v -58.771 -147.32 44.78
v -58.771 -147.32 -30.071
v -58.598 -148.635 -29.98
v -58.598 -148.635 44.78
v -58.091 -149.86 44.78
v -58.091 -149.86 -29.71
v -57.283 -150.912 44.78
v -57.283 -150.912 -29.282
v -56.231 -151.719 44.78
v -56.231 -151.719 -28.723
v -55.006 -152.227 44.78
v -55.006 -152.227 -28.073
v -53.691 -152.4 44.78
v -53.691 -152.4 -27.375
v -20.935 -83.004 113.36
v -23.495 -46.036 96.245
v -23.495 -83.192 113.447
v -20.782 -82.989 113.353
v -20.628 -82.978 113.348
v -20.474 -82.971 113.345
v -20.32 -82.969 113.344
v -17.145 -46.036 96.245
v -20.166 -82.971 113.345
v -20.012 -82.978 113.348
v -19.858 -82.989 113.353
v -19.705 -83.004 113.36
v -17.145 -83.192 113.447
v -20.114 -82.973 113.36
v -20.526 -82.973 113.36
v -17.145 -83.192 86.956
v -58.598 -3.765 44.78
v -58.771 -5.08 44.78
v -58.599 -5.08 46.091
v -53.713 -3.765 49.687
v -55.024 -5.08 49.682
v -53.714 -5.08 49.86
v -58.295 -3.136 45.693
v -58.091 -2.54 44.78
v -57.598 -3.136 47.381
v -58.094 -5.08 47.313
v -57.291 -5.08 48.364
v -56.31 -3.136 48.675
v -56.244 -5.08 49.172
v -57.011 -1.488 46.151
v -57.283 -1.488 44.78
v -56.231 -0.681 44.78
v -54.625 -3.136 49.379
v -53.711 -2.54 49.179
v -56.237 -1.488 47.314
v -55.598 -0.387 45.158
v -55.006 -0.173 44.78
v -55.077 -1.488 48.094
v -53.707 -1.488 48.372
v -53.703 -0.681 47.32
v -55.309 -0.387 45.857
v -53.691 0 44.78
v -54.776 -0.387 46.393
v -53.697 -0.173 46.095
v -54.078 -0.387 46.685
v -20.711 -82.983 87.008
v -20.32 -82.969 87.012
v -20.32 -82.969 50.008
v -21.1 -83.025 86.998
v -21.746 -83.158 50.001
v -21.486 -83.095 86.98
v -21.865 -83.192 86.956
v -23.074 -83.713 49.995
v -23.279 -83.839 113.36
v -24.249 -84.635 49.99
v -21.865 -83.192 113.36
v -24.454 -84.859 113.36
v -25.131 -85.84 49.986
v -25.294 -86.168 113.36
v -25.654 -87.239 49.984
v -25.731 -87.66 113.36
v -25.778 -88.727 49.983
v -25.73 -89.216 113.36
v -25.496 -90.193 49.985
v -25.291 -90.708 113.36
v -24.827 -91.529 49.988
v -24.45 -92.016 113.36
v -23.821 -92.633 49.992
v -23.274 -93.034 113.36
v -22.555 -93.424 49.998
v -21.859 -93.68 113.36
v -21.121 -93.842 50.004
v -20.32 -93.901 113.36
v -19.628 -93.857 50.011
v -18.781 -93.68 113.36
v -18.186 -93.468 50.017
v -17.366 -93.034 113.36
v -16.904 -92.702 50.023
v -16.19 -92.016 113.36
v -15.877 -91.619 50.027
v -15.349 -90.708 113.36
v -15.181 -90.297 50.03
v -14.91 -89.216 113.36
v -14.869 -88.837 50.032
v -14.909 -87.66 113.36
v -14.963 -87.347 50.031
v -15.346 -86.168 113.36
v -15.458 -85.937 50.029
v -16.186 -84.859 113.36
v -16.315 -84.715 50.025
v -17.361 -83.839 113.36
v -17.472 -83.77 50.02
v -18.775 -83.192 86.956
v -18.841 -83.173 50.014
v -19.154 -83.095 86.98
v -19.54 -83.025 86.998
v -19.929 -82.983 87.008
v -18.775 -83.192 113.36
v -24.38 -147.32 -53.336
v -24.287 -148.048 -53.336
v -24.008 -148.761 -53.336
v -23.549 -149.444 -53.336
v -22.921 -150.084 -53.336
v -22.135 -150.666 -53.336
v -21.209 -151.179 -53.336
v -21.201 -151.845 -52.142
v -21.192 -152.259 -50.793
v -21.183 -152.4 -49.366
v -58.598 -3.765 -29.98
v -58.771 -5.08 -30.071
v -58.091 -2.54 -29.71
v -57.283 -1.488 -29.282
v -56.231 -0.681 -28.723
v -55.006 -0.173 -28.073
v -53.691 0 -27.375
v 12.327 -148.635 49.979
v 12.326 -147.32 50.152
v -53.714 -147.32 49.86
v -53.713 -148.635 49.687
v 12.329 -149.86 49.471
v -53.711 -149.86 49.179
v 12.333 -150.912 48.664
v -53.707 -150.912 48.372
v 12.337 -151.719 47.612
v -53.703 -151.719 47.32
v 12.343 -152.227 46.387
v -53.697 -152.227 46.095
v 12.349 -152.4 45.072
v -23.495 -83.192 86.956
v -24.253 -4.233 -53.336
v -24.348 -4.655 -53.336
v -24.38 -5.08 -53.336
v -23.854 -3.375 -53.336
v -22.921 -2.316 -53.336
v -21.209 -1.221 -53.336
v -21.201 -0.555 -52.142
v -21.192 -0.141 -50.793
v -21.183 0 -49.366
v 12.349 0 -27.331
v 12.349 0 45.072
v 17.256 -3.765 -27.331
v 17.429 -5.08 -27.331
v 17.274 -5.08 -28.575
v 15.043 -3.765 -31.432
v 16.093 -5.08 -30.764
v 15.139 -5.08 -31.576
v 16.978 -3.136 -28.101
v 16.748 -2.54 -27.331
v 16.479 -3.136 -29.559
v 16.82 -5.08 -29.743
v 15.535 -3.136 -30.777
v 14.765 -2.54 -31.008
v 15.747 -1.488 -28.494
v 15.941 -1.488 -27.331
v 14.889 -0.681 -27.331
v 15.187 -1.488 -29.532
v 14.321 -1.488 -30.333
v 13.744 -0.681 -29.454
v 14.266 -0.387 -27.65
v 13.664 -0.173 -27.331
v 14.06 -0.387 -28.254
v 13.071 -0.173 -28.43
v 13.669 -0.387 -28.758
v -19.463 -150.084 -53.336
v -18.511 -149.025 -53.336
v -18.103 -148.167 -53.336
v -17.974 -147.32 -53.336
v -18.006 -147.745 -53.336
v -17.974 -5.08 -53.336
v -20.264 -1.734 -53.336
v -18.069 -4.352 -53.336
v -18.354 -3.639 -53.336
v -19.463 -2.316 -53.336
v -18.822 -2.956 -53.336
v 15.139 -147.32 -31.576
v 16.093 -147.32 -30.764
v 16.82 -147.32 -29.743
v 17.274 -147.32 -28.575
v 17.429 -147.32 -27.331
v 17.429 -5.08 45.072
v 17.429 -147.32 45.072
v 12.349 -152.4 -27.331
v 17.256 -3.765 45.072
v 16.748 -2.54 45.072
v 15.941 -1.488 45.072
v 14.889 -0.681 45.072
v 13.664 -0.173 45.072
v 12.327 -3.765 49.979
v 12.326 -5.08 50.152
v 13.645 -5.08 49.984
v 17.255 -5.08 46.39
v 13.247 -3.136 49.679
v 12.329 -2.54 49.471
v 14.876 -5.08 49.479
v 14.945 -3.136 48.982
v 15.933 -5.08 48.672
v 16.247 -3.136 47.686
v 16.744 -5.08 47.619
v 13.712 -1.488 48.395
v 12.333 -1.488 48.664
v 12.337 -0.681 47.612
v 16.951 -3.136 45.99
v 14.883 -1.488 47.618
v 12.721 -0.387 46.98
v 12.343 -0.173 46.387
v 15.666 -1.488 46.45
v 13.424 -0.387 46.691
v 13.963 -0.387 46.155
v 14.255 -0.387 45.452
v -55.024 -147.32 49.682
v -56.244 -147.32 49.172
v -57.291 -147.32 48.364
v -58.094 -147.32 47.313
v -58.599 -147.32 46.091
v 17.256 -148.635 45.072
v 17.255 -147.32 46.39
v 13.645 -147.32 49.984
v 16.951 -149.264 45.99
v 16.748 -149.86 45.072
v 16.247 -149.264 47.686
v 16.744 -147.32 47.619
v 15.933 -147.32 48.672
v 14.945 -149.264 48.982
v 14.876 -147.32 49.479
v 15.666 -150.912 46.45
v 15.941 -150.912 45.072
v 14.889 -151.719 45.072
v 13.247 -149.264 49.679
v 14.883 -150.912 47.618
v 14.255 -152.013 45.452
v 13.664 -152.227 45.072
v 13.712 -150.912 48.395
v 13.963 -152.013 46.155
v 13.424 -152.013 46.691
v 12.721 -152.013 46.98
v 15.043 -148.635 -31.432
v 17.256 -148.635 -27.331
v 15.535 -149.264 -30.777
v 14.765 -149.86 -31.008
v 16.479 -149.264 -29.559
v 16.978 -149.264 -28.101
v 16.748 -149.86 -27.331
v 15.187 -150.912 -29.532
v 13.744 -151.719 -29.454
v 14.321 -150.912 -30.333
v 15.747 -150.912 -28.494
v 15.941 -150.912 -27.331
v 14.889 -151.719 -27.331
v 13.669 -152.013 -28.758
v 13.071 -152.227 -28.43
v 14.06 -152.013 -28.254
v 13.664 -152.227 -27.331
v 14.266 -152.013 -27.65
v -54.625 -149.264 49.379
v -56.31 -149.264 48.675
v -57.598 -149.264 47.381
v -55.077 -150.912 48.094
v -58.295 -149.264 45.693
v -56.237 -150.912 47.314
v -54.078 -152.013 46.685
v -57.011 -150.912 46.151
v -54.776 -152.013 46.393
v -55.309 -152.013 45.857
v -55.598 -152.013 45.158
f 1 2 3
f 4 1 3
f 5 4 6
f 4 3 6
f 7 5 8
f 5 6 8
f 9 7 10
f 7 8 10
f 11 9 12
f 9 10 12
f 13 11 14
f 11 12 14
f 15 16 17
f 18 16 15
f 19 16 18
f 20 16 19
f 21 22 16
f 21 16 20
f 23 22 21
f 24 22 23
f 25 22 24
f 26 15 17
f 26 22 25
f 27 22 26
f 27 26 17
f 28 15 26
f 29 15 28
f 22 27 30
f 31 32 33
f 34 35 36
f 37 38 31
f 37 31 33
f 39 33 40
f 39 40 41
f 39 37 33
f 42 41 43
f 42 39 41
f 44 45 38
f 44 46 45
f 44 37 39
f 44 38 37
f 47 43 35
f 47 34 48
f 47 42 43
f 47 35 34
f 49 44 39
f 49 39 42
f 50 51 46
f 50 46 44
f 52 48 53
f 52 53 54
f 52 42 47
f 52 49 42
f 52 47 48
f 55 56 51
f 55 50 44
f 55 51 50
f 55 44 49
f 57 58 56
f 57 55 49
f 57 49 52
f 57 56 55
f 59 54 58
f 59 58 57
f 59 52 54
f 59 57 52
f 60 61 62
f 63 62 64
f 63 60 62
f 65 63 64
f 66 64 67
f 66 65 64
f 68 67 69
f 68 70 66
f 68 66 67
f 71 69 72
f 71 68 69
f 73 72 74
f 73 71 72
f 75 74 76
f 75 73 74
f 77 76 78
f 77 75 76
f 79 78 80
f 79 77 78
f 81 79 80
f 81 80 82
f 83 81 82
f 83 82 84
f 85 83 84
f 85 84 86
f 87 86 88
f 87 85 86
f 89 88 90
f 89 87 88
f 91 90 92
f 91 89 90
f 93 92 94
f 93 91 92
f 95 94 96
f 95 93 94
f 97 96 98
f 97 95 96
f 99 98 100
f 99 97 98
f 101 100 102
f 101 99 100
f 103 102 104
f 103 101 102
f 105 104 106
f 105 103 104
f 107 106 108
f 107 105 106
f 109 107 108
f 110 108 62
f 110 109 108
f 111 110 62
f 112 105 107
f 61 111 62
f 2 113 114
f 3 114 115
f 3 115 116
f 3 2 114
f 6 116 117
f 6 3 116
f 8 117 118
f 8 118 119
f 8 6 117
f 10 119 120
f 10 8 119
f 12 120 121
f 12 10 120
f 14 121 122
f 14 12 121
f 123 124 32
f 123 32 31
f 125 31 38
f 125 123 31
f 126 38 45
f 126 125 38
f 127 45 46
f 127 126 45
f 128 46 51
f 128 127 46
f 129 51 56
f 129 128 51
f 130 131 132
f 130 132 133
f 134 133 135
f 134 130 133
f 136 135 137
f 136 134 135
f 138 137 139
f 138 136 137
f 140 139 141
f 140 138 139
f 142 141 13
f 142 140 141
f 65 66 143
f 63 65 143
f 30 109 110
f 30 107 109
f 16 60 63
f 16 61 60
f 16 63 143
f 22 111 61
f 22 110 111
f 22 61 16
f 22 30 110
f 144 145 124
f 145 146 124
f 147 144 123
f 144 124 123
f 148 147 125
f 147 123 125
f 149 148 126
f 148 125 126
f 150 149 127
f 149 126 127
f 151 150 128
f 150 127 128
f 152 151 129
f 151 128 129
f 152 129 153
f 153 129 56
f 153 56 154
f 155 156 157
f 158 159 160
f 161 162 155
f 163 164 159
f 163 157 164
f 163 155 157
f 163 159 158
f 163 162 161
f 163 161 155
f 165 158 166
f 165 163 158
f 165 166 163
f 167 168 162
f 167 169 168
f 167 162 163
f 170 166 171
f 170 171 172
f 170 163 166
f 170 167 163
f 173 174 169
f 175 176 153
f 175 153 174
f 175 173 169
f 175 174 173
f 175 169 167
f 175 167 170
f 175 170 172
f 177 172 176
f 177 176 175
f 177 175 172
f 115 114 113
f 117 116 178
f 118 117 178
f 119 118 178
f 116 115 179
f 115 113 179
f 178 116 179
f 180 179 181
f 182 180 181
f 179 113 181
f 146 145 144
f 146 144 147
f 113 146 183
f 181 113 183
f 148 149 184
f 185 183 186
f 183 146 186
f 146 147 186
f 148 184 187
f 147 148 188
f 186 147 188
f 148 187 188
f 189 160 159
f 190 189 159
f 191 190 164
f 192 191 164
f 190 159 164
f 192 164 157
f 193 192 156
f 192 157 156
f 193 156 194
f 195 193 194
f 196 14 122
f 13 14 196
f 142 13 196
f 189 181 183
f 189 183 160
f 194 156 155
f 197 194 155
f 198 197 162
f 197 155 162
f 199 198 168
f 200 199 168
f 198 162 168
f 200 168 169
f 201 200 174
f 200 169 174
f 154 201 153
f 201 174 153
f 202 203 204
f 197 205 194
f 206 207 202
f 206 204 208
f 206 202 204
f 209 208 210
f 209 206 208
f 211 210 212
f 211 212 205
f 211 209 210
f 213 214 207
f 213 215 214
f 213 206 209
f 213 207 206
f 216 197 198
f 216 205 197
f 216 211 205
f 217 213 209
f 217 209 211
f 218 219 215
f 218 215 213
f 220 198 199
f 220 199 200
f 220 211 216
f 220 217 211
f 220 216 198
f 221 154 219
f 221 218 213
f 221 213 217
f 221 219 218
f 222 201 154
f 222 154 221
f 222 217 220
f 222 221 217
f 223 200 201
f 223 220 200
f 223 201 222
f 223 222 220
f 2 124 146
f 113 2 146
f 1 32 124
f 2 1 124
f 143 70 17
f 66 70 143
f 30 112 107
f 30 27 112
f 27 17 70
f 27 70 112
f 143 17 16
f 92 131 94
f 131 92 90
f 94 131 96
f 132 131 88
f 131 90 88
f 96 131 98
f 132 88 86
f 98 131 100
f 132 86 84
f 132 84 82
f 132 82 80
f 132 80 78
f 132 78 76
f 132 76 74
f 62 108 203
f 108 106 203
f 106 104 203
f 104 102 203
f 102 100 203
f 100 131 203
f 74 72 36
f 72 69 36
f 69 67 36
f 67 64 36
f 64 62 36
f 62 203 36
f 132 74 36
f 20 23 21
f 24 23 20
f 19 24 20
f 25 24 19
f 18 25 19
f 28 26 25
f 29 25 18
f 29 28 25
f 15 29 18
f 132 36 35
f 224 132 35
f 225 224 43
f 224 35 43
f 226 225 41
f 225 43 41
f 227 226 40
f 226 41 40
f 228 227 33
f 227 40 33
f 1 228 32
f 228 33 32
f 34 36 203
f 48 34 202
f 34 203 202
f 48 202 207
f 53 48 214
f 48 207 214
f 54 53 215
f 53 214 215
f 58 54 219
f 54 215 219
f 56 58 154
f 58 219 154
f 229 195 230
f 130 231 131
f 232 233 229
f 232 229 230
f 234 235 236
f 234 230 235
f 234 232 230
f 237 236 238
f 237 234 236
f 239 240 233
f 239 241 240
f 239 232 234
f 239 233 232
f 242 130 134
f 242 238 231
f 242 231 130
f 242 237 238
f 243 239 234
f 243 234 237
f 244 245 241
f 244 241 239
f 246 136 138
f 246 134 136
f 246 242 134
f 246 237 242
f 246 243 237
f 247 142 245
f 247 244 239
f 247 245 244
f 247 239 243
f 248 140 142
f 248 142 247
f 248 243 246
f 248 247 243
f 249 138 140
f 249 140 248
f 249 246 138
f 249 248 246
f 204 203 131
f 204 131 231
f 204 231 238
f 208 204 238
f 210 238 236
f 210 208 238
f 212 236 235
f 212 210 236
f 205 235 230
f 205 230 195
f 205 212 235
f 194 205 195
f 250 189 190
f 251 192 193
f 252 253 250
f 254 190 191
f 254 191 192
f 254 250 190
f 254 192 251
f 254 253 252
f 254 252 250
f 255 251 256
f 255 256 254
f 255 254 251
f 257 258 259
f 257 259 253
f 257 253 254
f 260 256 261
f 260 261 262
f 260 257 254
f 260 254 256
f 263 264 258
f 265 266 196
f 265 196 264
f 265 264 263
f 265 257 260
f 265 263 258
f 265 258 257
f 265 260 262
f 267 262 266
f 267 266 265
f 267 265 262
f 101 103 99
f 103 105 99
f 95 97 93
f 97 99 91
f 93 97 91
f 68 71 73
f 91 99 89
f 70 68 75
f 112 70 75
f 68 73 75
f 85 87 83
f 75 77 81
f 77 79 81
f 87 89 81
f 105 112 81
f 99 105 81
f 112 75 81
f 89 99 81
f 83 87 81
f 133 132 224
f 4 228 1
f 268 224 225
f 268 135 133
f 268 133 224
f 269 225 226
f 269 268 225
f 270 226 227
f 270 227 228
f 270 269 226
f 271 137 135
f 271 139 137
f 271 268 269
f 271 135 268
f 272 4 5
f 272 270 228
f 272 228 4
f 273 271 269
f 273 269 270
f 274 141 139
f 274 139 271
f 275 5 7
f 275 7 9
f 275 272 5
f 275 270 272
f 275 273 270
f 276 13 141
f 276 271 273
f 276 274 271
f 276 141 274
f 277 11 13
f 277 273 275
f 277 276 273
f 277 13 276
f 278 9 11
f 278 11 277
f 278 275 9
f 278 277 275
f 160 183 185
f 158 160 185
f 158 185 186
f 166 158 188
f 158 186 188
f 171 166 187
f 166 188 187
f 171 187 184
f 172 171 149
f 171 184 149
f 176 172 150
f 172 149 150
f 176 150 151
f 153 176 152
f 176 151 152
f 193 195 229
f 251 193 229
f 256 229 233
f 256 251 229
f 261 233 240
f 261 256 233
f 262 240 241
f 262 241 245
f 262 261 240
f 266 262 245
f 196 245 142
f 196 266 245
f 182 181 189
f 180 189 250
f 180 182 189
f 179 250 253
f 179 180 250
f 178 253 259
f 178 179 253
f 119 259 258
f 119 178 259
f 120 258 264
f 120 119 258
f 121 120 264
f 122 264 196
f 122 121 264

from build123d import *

# Parameters (mm, degrees)
F1_DEPTH     = 152.4
F2_T1_DEPTH  = 159.9639298233
F2_T3_DEPTH  = 87.5512753886
F2_T5_DEPTH  = 105.6460143168
F2_T7_DEPTH  = 83.8431740092
F2_T9_DEPTH  = 66.9209927252
F2_T11_DEPTH = 67.7625979145
F2_T16_DEPTH = 5.08
F4_W         = 5.4661177176
F4_H         = 63.5
F7_DEPTH     = 3.175
F8_T1_DEPTH  = 142.24
F8_T3_DEPTH  = 87.5512753886
F8_T5_DEPTH  = 66.9209927252
F8_T7_DEPTH  = 52.3221869503
F8_T9_DEPTH  = 72.4030758235
F8_T11_DEPTH = 66.0406464801
F8_T16_DEPTH = 5.08
F8_T22_DEPTH = 5.08
F8_T28_DEPTH = 5.08
F8_T34_DEPTH = 5.08
F8_T38_ANGLE = 89.746481368


# Not quite as in the source:
# - a fillet or chamfer that OpenCascade refuses, or shapes differently, is made with other operations: its cross-section is extruded or revolved along the edge and cut away or added


with BuildPart() as f1:
    # F0 (on Front) → F1 (new body)
    with BuildSketch(Plane.XZ):
        Polygon((17.4287217617, 50.174562376), (-58.7712782383, 49.8373953771), (-58.7712782383, -30.0714519408), (-24.3801281386, -53.3360523395), (-17.9739344996, -53.3360523395), (17.4287217617, -30.0714519408), align=None)
    extrude(amount=F1_DEPTH)

    # F2: fillet of radius 5.08 on 6 edges, made by hand

    # F2_s2 → F2_t1 (cut)
    with BuildSketch(Plane.XZ.offset(-12.6439298233)):
        with BuildLine():
            ThreePointArc((-53.7137558182, 49.859773719), (-57.2913189399, 48.3639700613), (-58.7712782383, 44.7798234478))
            Line((-58.7712782383, 44.7798234478), (-58.7712782383, 49.8373953771))
            Line((-58.7712782383, 49.8373953771), (-53.7137558182, 49.859773719))
        make_face()
    extrude(amount=F2_T1_DEPTH, mode=Mode.SUBTRACT)

    # F2_s4 → F2_t3 (cut)
    with BuildSketch(Plane.XY.offset(-42.7714519408)):
        with BuildLine():
            ThreePointArc((-58.7712782383, -147.32), (-57.2833806867, -150.9121024484), (-53.6912782383, -152.4))
            Line((-53.6912782383, -152.4), (-58.7712782383, -152.4))
            Line((-58.7712782383, -152.4), (-58.7712782383, -147.32))
        make_face()
    extrude(amount=F2_T3_DEPTH, mode=Mode.SUBTRACT)

    # F2_s6 → F2_t5 (cut)
    with BuildSketch(Plane.XY.offset(-42.7714519408)):
        with BuildLine():
            ThreePointArc((17.4287217617, -147.32), (15.9408242101, -150.9121024484), (12.3487217617, -152.4))
            Line((12.3487217617, -152.4), (17.4287217617, -152.4))
            Line((17.4287217617, -152.4), (17.4287217617, -147.32))
        make_face()
    extrude(amount=F2_T5_DEPTH, mode=Mode.SUBTRACT)

    # F2_s8 → F2_t7 (cut)
    with BuildSketch(Plane(origin=(30.3502624567, 0, 0.1342927416), x_dir=(0, 1, 0), z_dir=(-0.9999902109, 0, -0.0044247205))):
        with BuildLine():
            ThreePointArc((-147.32, -50.0969539894), (-150.9121024484, -48.6090564378), (-152.4, -45.0169539894))
            Line((-152.4, -45.0169539894), (-152.4, -50.0969539894))
            Line((-152.4, -50.0969539894), (-147.32, -50.0969539894))
        make_face()
    extrude(amount=F2_T7_DEPTH, mode=Mode.SUBTRACT)

    # F2_s10 → F2_t9 (cut)
    with BuildSketch(Plane(origin=(-36.8834278428, 0, 24.9505529071), x_dir=(0, 1, 0), z_dir=(0.8282834259, 0, -0.5603093489))):
        with BuildLine():
            ThreePointArc((-147.32, -57.8377818767), (-150.9121024484, -56.3498843251), (-152.4, -52.7577818767))
            Line((-152.4, -52.7577818767), (-152.4, -57.8377818767))
            Line((-152.4, -57.8377818767), (-147.32, -57.8377818767))
        make_face()
    extrude(amount=F2_T9_DEPTH, mode=Mode.SUBTRACT)

    # F2_s12 → F2_t11 (cut)
    with BuildSketch(Plane(origin=(-47.6451540495, 0, -31.3096695828), x_dir=(0, 1, 0), z_dir=(0.8357055045, 0, 0.549177849))):
        with BuildLine():
            ThreePointArc((-147.32, -34.7023458418), (-150.9121024484, -33.2144482902), (-152.4, -29.6223458418))
            Line((-152.4, -29.6223458418), (-152.4, -34.7023458418))
            Line((-152.4, -34.7023458418), (-147.32, -34.7023458418))
        make_face()
    extrude(amount=F2_T11_DEPTH, mode=Mode.SUBTRACT)


with BuildPart() as f2_tool14:
    # F2_s15 → F2_t16 (new body)
    with BuildSketch(Plane.XZ.offset(147.32)):
        Polygon((-53.6912782383, 44.7798234478), (-53.7137558182, 49.859773719), (-58.7712782383, 49.8373953771), (-58.7712782383, 44.7798234478), align=None)
    extrude(amount=F2_T16_DEPTH)

    # F2_s17 → F2_t18 (revolve, cut)
    with BuildSketch(Plane(origin=(-53.6912782383, -147.32, 44.7798234478), x_dir=(0.7086694294, 0, -0.7055406719), z_dir=(-0.7055406719, 0, -0.7086694294))):
        with BuildLine():
            ThreePointArc((0, -5.08), (5.08, 0), (0, 5.08))
            Line((0, 5.08), (0, -5.08))
        make_face()
    revolve(axis=Axis((-53.6912782383, -147.32, 44.7798234478), (0, -1, 0)), mode=Mode.SUBTRACT)


with BuildPart() as f1_1:
    add(f1.part)

    # F2_t13: cut F2_tool14
    add(f2_tool14.part, mode=Mode.SUBTRACT)

    # F4 (on offset) → F5 (revolve)
    with BuildSketch(Plane.YZ.offset(-20.32)):
        with Locations((-85.7021328023, 81.609773719)):
            Rectangle(F4_W, F4_H)
    revolve(axis=Axis((-20.32, -88.4351916611, 88.4142501174), (0, 0, 1)))

    # F6 (on offset) → F7 (join, symmetric)
    with BuildSketch(Plane.YZ.offset(-20.32)):
        Polygon((-46.0359752178, 96.2450280786), (-83.1919163465, 113.4468540549), (-83.1919163465, 86.9560390711), align=None)
    extrude(amount=F7_DEPTH, both=True)

    # F8: fillet of radius 5.08 on 8 edges, made by hand

    # F8_s2 → F8_t1 (cut)
    with BuildSketch(Plane.XZ.offset(5.08)):
        with BuildLine():
            ThreePointArc((12.3262441818, 50.1519851181), (15.9328683752, 48.6720755484), (17.4287217617, 45.0720348468))
            Line((17.4287217617, 45.0720348468), (17.4287217617, 50.174562376))
            Line((17.4287217617, 50.174562376), (12.3262441818, 50.1519851181))
        make_face()
        with BuildLine():
            ThreePointArc((15.1385452344, -31.5764249394), (16.8196670332, -29.7428967724), (17.4287217617, -27.3310409766))
            Line((17.4287217617, -27.3310409766), (17.4287217617, -30.0714519408))
            Line((17.4287217617, -30.0714519408), (15.1385452344, -31.5764249394))
        make_face()
    extrude(amount=F8_T1_DEPTH, mode=Mode.SUBTRACT)

    # F8_s4 → F8_t3 (cut)
    with BuildSketch(Plane.XY.offset(-42.7714519408)):
        with BuildLine():
            ThreePointArc((-58.7712782383, -5.08), (-57.2833806867, -1.4878975516), (-53.6912782383, 0))
            Line((-53.6912782383, 0), (-58.7712782383, 0))
            Line((-58.7712782383, 0), (-58.7712782383, -5.08))
        make_face()
    extrude(amount=F8_T3_DEPTH, mode=Mode.SUBTRACT)

    # F8_s6 → F8_t5 (cut)
    with BuildSketch(Plane(origin=(-36.8834278428, 0, 24.9505529071), x_dir=(0, 1, 0), z_dir=(0.8282834259, 0, -0.5603093489))):
        with BuildLine():
            ThreePointArc((-5.08, -57.8377818767), (-1.4878975516, -56.3498843251), (0, -52.7577818767))
            Line((0, -52.7577818767), (0, -57.8377818767))
            Line((0, -57.8377818767), (-5.08, -57.8377818767))
        make_face()
    extrude(amount=F8_T5_DEPTH, mode=Mode.SUBTRACT)

    # F8_s8 → F8_t7 (cut)
    with BuildSketch(Plane(origin=(-47.6451540495, 0, -31.3096695828), x_dir=(0, 1, 0), z_dir=(0.8357055045, 0, 0.549177849))):
        with BuildLine():
            ThreePointArc((-5.08, -34.7023458418), (-1.4878975516, -33.2144482902), (0, -29.6223458418))
            Line((0, -29.6223458418), (0, -34.7023458418))
            Line((0, -34.7023458418), (-5.08, -34.7023458418))
        make_face()
    extrude(amount=F8_T7_DEPTH, mode=Mode.SUBTRACT)

    # F8_s10 → F8_t9 (cut)
    with BuildSketch(Plane.XY.offset(-27.3310409766)):
        with BuildLine():
            ThreePointArc((17.4287217617, -5.08), (15.9408242101, -1.4878975516), (12.3487217617, 0))
            Line((12.3487217617, 0), (17.4287217617, 0))
            Line((17.4287217617, 0), (17.4287217617, -5.08))
        make_face()
    extrude(amount=F8_T9_DEPTH, mode=Mode.SUBTRACT)

    # F8_s12 → F8_t11 (cut)
    with BuildSketch(Plane(origin=(12.5479091987, 0, 0.055521534), x_dir=(0, 1, 0), z_dir=(-0.9999902109, 0, -0.0044247205))):
        with BuildLine():
            ThreePointArc((-5.08, -50.0969539894), (-1.4878975516, -48.6090564378), (0, -45.0169539894))
            Line((0, -45.0169539894), (0, -50.0969539894))
            Line((0, -50.0969539894), (-5.08, -50.0969539894))
        make_face()
    extrude(amount=F8_T11_DEPTH, mode=Mode.SUBTRACT)


with BuildPart() as f8_tool14:
    # F8_s15 → F8_t16 (new body)
    with BuildSketch(Plane.XZ.offset(147.32)):
        Polygon((12.3487217617, -27.3310409766), (15.1385452344, -31.5764249394), (17.4287217617, -30.0714519408), (17.4287217617, -27.3310409766), align=None)
    extrude(amount=F8_T16_DEPTH)

    # F8_s17 → F8_t18 (revolve, cut)
    with BuildSketch(Plane(origin=(12.3487217617, -147.32, -27.3310409766), x_dir=(-0.8801073369, 0, 0.4747747629), z_dir=(0.4747747629, 0, 0.8801073369))):
        with BuildLine():
            ThreePointArc((0, -5.08), (5.08, 0), (0, 5.08))
            Line((0, 5.08), (0, -5.08))
        make_face()
    revolve(axis=Axis((12.3487217617, -147.32, -27.3310409766), (0, -1, 0)), mode=Mode.SUBTRACT)


with BuildPart() as f1_2:
    add(f1_1.part)

    # F8_t13: cut F8_tool14
    add(f8_tool14.part, mode=Mode.SUBTRACT)


with BuildPart() as f8_tool20:
    # F8_s21 → F8_t22 (new body)
    with BuildSketch(Plane.XZ.offset(147.32)):
        Polygon((12.3487217617, 45.0720348468), (12.3262441818, 50.1519851181), (17.4287217617, 50.174562376), (17.4287217617, 45.0720348468), align=None)
    extrude(amount=F8_T22_DEPTH)

    # F8_s23 → F8_t24 (revolve, cut)
    with BuildSketch(Plane(origin=(12.3487217617, -147.32, 45.0720348468), x_dir=(-0.7055406719, 0, -0.7086694294), z_dir=(-0.7086694294, 0, 0.7055406719))):
        with BuildLine():
            ThreePointArc((0, -5.08), (5.08, 0), (0, 5.08))
            Line((0, 5.08), (0, -5.08))
        make_face()
    revolve(axis=Axis((12.3487217617, -147.32, 45.0720348468), (0, -1, 0)), mode=Mode.SUBTRACT)


with BuildPart() as f1_3:
    add(f1_2.part)

    # F8_t19: cut F8_tool20
    add(f8_tool20.part, mode=Mode.SUBTRACT)


with BuildPart() as f8_tool26:
    # F8_s27 → F8_t28 (new body)
    with BuildSketch(Plane.XZ.offset(5.08)):
        Polygon((12.3487217617, 45.0720348468), (12.3262441818, 50.1519851181), (17.4287217617, 50.174562376), (17.4287217617, 45.0720348468), align=None)
    extrude(amount=-F8_T28_DEPTH)

    # F8_s29 → F8_t30 (revolve, cut)
    with BuildSketch(Plane(origin=(12.3487217617, -5.08, 45.0720348468), x_dir=(-0.7055406719, 0, -0.7086694294), z_dir=(0.7086694294, 0, -0.7055406719))):
        with BuildLine():
            ThreePointArc((0, -5.08), (5.08, 0), (0, 5.08))
            Line((0, 5.08), (0, -5.08))
        make_face()
    revolve(axis=Axis((12.3487217617, -5.08, 45.0720348468), (0, 1, 0)), mode=Mode.SUBTRACT)


with BuildPart() as f1_4:
    add(f1_3.part)

    # F8_t25: cut F8_tool26
    add(f8_tool26.part, mode=Mode.SUBTRACT)


with BuildPart() as f8_tool32:
    # F8_s33 → F8_t34 (new body)
    with BuildSketch(Plane.XZ.offset(5.08)):
        Polygon((12.3487217617, -27.3310409766), (15.1385452344, -31.5764249394), (17.4287217617, -30.0714519408), (17.4287217617, -27.3310409766), align=None)
    extrude(amount=-F8_T34_DEPTH)

    # F8_s35 → F8_t36 (revolve, cut)
    with BuildSketch(Plane(origin=(12.3487217617, -5.08, -27.3310409766), x_dir=(-0.8801073369, 0, 0.4747747629), z_dir=(-0.4747747629, 0, -0.8801073369))):
        with BuildLine():
            ThreePointArc((0, -5.08), (5.08, 0), (0, 5.08))
            Line((0, 5.08), (0, -5.08))
        make_face()
    revolve(axis=Axis((12.3487217617, -5.08, -27.3310409766), (0, 1, 0)), mode=Mode.SUBTRACT)


with BuildPart() as f1_5:
    add(f1_4.part)

    # F8_t31: cut F8_tool32
    add(f8_tool32.part, mode=Mode.SUBTRACT)

    # F8_s37 → F8_t38 (revolve, cut)
    with BuildSketch(Plane.XY.offset(44.7798234479)):
        with BuildLine():
            ThreePointArc((-58.7712782383, -5.08), (-57.2833806867, -1.4878975516), (-53.6912782383, 0))
            Line((-53.6912782383, 0), (-58.7712782383, 0))
            Line((-58.7712782383, 0), (-58.7712782383, -5.08))
        make_face()
    revolve(axis=Axis((-53.6912782384, 0, 44.7798234479), (0, 1, 0)), revolution_arc=F8_T38_ANGLE, mode=Mode.SUBTRACT)


solid = f1_5.part
